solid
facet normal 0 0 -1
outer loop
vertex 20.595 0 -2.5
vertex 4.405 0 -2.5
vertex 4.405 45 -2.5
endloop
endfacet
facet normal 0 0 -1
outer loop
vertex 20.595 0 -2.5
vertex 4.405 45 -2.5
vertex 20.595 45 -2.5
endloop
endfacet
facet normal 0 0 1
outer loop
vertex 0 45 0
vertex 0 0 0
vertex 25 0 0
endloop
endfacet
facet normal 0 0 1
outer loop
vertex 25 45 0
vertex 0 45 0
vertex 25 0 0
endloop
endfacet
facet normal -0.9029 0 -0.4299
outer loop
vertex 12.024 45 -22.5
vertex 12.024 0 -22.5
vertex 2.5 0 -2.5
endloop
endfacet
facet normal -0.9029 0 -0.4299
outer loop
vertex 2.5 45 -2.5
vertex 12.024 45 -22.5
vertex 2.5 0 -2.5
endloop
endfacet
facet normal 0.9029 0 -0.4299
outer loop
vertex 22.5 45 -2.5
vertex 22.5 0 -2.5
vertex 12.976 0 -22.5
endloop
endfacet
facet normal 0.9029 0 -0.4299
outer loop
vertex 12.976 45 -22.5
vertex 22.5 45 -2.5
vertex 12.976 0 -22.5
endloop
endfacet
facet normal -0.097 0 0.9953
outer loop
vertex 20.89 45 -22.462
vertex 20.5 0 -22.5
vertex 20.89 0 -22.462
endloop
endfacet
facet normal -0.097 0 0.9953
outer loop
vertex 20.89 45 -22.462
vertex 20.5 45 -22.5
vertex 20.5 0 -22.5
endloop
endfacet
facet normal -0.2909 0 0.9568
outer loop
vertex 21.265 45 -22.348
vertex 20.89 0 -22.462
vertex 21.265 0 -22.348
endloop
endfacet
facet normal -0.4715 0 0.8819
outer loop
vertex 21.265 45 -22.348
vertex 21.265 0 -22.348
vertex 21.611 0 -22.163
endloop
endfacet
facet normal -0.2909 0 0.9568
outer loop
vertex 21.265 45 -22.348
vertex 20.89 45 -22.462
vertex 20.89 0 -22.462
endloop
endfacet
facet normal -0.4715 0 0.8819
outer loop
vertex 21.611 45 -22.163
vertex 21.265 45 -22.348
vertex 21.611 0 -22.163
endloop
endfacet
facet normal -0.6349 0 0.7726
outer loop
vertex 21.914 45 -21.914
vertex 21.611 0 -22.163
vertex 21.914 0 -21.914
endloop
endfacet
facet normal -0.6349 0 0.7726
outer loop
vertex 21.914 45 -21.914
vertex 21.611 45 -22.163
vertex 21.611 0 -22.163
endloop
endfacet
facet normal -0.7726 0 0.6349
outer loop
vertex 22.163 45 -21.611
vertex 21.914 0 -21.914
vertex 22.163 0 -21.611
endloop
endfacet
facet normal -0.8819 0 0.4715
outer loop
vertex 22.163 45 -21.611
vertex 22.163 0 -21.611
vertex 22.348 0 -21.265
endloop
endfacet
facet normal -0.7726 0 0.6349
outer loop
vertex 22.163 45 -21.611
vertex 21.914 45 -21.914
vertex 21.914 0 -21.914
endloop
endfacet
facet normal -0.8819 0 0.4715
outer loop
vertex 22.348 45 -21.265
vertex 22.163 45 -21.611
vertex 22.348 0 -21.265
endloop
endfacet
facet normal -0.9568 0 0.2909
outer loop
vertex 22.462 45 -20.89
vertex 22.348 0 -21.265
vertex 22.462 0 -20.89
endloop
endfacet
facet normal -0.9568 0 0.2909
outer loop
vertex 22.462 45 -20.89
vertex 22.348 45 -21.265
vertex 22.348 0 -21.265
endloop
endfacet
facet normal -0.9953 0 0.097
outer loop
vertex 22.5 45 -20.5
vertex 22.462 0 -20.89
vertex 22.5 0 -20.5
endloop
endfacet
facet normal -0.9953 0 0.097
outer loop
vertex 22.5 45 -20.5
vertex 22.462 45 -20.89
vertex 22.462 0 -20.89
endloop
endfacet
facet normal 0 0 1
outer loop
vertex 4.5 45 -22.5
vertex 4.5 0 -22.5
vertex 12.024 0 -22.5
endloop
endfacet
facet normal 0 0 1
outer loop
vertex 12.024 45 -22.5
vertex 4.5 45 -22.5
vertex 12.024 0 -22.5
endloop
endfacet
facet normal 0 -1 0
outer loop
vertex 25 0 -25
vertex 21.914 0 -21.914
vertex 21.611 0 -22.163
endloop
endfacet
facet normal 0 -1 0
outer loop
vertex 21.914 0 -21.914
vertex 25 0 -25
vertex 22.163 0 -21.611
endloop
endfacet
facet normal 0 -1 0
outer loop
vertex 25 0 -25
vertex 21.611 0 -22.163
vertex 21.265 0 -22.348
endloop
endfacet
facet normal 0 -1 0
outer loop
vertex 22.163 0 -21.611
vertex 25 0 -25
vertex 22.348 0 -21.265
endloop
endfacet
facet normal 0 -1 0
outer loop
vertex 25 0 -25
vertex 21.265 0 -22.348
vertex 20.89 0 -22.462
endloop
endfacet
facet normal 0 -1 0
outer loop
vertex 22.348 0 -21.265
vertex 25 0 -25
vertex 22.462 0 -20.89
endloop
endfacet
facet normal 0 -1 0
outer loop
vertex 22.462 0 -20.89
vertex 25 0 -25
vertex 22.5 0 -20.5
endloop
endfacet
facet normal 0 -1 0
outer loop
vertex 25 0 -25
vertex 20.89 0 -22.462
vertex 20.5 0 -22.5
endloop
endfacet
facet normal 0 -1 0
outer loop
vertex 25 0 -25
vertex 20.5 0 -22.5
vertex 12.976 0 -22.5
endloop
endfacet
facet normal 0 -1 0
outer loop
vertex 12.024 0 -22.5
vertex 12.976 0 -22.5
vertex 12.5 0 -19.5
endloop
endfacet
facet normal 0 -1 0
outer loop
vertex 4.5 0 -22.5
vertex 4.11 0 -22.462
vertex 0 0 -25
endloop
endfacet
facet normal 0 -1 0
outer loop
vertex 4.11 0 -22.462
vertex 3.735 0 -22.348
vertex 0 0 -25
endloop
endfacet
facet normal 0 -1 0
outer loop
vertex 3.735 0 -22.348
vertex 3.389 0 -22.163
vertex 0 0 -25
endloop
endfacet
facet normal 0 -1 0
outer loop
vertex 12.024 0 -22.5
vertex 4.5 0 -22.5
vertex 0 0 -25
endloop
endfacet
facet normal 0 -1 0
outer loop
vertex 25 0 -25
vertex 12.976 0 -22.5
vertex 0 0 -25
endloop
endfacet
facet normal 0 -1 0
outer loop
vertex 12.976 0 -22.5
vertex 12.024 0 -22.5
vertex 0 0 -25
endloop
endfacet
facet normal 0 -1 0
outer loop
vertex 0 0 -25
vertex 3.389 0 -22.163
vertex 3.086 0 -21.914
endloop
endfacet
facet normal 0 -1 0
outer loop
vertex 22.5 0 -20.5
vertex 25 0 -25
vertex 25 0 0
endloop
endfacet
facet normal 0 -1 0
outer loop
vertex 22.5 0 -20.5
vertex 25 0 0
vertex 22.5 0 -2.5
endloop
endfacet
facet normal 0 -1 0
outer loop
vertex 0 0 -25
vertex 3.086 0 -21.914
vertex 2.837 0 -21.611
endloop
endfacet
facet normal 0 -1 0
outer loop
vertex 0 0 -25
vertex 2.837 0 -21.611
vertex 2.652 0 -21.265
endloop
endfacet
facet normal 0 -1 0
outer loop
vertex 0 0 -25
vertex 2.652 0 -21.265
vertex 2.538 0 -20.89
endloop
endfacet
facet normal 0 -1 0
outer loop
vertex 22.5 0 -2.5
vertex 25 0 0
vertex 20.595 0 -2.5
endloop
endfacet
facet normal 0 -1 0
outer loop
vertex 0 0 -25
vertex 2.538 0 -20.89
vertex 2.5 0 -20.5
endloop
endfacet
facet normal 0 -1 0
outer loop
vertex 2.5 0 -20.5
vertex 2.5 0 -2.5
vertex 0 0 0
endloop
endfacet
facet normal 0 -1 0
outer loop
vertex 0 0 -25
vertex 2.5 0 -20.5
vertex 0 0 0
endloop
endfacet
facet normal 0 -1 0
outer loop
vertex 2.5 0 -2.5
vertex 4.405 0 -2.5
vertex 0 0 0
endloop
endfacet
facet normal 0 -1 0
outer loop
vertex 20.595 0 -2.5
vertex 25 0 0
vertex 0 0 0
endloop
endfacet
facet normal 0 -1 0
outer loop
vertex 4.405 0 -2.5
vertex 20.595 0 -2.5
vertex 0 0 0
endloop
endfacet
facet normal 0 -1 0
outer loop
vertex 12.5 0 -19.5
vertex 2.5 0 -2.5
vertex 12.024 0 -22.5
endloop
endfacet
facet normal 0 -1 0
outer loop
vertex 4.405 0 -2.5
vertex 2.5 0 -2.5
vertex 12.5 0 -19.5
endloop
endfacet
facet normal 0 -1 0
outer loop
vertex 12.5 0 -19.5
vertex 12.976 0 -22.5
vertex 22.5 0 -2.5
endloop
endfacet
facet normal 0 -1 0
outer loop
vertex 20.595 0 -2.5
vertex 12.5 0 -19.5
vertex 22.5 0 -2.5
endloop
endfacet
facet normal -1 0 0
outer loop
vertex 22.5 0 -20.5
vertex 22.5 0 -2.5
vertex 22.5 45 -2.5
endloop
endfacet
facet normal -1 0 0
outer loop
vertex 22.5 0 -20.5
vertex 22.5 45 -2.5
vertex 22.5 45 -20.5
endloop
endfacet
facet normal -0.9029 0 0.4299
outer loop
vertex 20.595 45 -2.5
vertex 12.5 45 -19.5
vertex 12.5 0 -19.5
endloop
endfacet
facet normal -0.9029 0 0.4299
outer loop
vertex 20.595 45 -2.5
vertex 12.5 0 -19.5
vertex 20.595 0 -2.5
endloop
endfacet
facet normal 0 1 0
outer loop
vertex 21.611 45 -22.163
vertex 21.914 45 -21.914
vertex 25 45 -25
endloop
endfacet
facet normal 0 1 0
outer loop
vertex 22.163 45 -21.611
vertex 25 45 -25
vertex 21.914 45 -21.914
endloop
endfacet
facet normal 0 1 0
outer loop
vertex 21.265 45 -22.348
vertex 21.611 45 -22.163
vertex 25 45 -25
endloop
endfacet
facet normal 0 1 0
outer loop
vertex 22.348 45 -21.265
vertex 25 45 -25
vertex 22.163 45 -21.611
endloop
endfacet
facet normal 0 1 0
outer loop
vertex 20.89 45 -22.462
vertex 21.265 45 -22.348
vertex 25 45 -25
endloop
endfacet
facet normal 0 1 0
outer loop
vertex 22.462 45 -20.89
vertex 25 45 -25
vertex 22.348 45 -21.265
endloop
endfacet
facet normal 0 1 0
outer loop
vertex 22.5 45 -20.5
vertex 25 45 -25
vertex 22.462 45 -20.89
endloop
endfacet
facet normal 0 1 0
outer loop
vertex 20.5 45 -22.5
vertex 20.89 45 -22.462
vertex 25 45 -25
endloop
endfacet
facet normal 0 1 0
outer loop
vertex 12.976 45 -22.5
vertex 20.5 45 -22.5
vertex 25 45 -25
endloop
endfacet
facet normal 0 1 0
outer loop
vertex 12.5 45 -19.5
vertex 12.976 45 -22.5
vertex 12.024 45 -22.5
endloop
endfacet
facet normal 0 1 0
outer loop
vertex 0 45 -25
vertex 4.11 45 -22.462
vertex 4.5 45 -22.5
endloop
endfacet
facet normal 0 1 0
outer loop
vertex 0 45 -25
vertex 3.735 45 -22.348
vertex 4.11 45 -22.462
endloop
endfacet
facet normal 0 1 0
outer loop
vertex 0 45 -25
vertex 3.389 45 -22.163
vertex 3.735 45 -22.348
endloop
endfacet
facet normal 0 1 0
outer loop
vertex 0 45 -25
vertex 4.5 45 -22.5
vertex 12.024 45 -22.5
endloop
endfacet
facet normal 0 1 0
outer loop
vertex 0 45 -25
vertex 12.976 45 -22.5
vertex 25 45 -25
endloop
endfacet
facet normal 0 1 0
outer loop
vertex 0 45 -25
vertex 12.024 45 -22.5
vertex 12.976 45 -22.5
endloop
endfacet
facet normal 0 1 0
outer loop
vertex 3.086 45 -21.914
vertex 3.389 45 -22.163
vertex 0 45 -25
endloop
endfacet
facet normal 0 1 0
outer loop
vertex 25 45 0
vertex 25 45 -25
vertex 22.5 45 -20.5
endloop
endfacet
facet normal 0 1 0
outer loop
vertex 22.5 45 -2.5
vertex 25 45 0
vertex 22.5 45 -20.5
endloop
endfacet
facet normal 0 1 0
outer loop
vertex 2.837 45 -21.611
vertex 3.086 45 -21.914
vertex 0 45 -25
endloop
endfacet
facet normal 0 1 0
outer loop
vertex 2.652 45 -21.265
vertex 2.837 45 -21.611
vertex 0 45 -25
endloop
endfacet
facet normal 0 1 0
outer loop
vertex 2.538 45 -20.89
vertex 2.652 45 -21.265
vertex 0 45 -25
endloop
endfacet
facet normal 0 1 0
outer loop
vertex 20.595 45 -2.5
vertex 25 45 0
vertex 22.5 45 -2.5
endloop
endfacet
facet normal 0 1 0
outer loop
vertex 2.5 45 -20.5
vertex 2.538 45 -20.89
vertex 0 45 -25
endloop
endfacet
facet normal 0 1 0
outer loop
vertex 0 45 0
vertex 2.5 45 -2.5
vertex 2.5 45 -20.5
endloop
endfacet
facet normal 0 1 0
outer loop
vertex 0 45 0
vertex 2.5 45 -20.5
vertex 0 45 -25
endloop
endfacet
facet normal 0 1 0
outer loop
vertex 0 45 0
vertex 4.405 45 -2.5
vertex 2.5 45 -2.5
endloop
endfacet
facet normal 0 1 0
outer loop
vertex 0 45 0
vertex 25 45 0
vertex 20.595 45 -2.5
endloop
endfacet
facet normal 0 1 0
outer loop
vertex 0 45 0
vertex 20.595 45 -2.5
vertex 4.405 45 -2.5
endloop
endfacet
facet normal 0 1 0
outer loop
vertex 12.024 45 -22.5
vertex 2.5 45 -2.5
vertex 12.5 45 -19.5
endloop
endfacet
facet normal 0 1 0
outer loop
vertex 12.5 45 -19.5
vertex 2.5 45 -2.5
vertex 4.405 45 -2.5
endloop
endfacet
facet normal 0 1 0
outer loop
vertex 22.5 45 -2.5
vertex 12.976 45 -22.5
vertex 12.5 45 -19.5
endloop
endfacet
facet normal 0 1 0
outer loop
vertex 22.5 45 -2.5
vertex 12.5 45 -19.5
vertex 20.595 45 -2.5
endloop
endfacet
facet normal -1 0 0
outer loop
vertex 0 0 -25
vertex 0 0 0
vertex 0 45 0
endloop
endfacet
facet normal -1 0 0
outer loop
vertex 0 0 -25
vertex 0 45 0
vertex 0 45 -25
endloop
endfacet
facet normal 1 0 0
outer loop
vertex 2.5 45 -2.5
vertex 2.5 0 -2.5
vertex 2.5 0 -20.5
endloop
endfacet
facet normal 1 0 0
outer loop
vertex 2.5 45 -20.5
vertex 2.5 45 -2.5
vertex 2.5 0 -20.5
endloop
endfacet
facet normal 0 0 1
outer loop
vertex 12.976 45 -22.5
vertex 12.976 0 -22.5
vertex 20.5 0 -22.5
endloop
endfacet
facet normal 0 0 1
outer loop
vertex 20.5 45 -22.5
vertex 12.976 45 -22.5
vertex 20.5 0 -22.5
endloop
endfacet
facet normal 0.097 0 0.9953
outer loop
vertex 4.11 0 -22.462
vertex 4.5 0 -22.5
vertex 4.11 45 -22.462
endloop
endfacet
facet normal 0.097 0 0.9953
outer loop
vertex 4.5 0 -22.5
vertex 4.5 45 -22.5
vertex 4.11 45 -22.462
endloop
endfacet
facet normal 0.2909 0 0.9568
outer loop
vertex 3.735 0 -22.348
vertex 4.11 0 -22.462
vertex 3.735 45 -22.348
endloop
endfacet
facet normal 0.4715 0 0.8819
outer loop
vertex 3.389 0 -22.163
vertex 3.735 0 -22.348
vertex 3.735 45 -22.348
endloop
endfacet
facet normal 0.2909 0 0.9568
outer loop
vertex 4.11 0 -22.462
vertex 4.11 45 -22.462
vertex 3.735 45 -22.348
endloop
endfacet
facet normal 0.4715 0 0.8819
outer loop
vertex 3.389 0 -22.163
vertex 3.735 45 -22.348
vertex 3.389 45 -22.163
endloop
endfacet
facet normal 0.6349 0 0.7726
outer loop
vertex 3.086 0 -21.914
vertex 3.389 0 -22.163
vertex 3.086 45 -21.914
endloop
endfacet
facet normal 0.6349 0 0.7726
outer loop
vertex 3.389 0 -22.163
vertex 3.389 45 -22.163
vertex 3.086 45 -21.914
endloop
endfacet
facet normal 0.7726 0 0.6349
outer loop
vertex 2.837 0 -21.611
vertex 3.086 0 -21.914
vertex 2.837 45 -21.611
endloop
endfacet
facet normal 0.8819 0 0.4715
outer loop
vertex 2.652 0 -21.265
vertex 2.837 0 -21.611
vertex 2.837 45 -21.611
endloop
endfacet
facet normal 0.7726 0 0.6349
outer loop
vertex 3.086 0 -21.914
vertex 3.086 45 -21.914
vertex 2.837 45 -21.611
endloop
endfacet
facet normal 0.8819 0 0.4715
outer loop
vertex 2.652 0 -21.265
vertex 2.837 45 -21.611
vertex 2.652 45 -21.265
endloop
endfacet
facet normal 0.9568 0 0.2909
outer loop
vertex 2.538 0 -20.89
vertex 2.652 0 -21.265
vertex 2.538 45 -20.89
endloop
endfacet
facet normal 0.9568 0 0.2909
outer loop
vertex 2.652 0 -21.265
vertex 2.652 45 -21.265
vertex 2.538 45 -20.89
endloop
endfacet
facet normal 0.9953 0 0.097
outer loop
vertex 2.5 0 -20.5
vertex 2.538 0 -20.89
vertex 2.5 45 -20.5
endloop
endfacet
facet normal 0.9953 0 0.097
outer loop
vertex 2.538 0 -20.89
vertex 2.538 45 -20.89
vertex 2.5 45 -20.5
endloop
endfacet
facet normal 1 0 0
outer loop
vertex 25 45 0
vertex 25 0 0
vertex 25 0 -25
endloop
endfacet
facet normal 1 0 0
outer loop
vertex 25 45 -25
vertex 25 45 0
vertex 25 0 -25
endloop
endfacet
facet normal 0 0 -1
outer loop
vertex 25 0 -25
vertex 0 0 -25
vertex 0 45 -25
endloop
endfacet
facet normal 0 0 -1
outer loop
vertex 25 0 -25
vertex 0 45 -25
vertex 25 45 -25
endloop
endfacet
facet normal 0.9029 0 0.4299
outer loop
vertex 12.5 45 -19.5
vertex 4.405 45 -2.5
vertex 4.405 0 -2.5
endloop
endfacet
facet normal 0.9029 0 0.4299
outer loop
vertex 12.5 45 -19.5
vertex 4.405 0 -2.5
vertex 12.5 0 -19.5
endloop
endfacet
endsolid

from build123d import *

# Parameters (mm, degrees)
SKETCH1_W           = 25
SKETCH1_H           = 25
SKETCH1_W_2         = 20
SKETCH1_H_2         = 20
BOSS_EXTRUDE1_DEPTH = 45
BOSS_EXTRUDE4_DEPTH = 45
FILLET2_R           = 2


with BuildPart() as part:
    # Sketch1 → Boss-Extrude1 (new body)
    with BuildSketch(Plane(origin=(0, 0, 0), x_dir=(1, 0, 0), z_dir=(0, 1, 0))):
        with Locations((12.5, 12.5)):
            Rectangle(SKETCH1_W, SKETCH1_H)
        with Locations((12.5, 12.5)):
            Rectangle(SKETCH1_W_2, SKETCH1_H_2, mode=Mode.SUBTRACT)
    extrude(amount=BOSS_EXTRUDE1_DEPTH)

    # Sketch3 → Boss-Extrude4 (add, through all)
    with BuildSketch(Plane.XZ):
        Polygon((22.5, -2.5), (12.5, -23.5), (2.5, -2.5), (4.404761905, -2.5), (12.5, -19.5), (20.595238095, -2.5), align=None)
    extrude(amount=-BOSS_EXTRUDE4_DEPTH)

    # Fillet2
    fillet2_edges = [part.edges().sort_by_distance(p)[0] for p in [
        (2.5, 22.5, -22.5),
        (22.5, 22.5, -22.5),
    ]]
    fillet(fillet2_edges, radius=FILLET2_R)


solid = part.part
